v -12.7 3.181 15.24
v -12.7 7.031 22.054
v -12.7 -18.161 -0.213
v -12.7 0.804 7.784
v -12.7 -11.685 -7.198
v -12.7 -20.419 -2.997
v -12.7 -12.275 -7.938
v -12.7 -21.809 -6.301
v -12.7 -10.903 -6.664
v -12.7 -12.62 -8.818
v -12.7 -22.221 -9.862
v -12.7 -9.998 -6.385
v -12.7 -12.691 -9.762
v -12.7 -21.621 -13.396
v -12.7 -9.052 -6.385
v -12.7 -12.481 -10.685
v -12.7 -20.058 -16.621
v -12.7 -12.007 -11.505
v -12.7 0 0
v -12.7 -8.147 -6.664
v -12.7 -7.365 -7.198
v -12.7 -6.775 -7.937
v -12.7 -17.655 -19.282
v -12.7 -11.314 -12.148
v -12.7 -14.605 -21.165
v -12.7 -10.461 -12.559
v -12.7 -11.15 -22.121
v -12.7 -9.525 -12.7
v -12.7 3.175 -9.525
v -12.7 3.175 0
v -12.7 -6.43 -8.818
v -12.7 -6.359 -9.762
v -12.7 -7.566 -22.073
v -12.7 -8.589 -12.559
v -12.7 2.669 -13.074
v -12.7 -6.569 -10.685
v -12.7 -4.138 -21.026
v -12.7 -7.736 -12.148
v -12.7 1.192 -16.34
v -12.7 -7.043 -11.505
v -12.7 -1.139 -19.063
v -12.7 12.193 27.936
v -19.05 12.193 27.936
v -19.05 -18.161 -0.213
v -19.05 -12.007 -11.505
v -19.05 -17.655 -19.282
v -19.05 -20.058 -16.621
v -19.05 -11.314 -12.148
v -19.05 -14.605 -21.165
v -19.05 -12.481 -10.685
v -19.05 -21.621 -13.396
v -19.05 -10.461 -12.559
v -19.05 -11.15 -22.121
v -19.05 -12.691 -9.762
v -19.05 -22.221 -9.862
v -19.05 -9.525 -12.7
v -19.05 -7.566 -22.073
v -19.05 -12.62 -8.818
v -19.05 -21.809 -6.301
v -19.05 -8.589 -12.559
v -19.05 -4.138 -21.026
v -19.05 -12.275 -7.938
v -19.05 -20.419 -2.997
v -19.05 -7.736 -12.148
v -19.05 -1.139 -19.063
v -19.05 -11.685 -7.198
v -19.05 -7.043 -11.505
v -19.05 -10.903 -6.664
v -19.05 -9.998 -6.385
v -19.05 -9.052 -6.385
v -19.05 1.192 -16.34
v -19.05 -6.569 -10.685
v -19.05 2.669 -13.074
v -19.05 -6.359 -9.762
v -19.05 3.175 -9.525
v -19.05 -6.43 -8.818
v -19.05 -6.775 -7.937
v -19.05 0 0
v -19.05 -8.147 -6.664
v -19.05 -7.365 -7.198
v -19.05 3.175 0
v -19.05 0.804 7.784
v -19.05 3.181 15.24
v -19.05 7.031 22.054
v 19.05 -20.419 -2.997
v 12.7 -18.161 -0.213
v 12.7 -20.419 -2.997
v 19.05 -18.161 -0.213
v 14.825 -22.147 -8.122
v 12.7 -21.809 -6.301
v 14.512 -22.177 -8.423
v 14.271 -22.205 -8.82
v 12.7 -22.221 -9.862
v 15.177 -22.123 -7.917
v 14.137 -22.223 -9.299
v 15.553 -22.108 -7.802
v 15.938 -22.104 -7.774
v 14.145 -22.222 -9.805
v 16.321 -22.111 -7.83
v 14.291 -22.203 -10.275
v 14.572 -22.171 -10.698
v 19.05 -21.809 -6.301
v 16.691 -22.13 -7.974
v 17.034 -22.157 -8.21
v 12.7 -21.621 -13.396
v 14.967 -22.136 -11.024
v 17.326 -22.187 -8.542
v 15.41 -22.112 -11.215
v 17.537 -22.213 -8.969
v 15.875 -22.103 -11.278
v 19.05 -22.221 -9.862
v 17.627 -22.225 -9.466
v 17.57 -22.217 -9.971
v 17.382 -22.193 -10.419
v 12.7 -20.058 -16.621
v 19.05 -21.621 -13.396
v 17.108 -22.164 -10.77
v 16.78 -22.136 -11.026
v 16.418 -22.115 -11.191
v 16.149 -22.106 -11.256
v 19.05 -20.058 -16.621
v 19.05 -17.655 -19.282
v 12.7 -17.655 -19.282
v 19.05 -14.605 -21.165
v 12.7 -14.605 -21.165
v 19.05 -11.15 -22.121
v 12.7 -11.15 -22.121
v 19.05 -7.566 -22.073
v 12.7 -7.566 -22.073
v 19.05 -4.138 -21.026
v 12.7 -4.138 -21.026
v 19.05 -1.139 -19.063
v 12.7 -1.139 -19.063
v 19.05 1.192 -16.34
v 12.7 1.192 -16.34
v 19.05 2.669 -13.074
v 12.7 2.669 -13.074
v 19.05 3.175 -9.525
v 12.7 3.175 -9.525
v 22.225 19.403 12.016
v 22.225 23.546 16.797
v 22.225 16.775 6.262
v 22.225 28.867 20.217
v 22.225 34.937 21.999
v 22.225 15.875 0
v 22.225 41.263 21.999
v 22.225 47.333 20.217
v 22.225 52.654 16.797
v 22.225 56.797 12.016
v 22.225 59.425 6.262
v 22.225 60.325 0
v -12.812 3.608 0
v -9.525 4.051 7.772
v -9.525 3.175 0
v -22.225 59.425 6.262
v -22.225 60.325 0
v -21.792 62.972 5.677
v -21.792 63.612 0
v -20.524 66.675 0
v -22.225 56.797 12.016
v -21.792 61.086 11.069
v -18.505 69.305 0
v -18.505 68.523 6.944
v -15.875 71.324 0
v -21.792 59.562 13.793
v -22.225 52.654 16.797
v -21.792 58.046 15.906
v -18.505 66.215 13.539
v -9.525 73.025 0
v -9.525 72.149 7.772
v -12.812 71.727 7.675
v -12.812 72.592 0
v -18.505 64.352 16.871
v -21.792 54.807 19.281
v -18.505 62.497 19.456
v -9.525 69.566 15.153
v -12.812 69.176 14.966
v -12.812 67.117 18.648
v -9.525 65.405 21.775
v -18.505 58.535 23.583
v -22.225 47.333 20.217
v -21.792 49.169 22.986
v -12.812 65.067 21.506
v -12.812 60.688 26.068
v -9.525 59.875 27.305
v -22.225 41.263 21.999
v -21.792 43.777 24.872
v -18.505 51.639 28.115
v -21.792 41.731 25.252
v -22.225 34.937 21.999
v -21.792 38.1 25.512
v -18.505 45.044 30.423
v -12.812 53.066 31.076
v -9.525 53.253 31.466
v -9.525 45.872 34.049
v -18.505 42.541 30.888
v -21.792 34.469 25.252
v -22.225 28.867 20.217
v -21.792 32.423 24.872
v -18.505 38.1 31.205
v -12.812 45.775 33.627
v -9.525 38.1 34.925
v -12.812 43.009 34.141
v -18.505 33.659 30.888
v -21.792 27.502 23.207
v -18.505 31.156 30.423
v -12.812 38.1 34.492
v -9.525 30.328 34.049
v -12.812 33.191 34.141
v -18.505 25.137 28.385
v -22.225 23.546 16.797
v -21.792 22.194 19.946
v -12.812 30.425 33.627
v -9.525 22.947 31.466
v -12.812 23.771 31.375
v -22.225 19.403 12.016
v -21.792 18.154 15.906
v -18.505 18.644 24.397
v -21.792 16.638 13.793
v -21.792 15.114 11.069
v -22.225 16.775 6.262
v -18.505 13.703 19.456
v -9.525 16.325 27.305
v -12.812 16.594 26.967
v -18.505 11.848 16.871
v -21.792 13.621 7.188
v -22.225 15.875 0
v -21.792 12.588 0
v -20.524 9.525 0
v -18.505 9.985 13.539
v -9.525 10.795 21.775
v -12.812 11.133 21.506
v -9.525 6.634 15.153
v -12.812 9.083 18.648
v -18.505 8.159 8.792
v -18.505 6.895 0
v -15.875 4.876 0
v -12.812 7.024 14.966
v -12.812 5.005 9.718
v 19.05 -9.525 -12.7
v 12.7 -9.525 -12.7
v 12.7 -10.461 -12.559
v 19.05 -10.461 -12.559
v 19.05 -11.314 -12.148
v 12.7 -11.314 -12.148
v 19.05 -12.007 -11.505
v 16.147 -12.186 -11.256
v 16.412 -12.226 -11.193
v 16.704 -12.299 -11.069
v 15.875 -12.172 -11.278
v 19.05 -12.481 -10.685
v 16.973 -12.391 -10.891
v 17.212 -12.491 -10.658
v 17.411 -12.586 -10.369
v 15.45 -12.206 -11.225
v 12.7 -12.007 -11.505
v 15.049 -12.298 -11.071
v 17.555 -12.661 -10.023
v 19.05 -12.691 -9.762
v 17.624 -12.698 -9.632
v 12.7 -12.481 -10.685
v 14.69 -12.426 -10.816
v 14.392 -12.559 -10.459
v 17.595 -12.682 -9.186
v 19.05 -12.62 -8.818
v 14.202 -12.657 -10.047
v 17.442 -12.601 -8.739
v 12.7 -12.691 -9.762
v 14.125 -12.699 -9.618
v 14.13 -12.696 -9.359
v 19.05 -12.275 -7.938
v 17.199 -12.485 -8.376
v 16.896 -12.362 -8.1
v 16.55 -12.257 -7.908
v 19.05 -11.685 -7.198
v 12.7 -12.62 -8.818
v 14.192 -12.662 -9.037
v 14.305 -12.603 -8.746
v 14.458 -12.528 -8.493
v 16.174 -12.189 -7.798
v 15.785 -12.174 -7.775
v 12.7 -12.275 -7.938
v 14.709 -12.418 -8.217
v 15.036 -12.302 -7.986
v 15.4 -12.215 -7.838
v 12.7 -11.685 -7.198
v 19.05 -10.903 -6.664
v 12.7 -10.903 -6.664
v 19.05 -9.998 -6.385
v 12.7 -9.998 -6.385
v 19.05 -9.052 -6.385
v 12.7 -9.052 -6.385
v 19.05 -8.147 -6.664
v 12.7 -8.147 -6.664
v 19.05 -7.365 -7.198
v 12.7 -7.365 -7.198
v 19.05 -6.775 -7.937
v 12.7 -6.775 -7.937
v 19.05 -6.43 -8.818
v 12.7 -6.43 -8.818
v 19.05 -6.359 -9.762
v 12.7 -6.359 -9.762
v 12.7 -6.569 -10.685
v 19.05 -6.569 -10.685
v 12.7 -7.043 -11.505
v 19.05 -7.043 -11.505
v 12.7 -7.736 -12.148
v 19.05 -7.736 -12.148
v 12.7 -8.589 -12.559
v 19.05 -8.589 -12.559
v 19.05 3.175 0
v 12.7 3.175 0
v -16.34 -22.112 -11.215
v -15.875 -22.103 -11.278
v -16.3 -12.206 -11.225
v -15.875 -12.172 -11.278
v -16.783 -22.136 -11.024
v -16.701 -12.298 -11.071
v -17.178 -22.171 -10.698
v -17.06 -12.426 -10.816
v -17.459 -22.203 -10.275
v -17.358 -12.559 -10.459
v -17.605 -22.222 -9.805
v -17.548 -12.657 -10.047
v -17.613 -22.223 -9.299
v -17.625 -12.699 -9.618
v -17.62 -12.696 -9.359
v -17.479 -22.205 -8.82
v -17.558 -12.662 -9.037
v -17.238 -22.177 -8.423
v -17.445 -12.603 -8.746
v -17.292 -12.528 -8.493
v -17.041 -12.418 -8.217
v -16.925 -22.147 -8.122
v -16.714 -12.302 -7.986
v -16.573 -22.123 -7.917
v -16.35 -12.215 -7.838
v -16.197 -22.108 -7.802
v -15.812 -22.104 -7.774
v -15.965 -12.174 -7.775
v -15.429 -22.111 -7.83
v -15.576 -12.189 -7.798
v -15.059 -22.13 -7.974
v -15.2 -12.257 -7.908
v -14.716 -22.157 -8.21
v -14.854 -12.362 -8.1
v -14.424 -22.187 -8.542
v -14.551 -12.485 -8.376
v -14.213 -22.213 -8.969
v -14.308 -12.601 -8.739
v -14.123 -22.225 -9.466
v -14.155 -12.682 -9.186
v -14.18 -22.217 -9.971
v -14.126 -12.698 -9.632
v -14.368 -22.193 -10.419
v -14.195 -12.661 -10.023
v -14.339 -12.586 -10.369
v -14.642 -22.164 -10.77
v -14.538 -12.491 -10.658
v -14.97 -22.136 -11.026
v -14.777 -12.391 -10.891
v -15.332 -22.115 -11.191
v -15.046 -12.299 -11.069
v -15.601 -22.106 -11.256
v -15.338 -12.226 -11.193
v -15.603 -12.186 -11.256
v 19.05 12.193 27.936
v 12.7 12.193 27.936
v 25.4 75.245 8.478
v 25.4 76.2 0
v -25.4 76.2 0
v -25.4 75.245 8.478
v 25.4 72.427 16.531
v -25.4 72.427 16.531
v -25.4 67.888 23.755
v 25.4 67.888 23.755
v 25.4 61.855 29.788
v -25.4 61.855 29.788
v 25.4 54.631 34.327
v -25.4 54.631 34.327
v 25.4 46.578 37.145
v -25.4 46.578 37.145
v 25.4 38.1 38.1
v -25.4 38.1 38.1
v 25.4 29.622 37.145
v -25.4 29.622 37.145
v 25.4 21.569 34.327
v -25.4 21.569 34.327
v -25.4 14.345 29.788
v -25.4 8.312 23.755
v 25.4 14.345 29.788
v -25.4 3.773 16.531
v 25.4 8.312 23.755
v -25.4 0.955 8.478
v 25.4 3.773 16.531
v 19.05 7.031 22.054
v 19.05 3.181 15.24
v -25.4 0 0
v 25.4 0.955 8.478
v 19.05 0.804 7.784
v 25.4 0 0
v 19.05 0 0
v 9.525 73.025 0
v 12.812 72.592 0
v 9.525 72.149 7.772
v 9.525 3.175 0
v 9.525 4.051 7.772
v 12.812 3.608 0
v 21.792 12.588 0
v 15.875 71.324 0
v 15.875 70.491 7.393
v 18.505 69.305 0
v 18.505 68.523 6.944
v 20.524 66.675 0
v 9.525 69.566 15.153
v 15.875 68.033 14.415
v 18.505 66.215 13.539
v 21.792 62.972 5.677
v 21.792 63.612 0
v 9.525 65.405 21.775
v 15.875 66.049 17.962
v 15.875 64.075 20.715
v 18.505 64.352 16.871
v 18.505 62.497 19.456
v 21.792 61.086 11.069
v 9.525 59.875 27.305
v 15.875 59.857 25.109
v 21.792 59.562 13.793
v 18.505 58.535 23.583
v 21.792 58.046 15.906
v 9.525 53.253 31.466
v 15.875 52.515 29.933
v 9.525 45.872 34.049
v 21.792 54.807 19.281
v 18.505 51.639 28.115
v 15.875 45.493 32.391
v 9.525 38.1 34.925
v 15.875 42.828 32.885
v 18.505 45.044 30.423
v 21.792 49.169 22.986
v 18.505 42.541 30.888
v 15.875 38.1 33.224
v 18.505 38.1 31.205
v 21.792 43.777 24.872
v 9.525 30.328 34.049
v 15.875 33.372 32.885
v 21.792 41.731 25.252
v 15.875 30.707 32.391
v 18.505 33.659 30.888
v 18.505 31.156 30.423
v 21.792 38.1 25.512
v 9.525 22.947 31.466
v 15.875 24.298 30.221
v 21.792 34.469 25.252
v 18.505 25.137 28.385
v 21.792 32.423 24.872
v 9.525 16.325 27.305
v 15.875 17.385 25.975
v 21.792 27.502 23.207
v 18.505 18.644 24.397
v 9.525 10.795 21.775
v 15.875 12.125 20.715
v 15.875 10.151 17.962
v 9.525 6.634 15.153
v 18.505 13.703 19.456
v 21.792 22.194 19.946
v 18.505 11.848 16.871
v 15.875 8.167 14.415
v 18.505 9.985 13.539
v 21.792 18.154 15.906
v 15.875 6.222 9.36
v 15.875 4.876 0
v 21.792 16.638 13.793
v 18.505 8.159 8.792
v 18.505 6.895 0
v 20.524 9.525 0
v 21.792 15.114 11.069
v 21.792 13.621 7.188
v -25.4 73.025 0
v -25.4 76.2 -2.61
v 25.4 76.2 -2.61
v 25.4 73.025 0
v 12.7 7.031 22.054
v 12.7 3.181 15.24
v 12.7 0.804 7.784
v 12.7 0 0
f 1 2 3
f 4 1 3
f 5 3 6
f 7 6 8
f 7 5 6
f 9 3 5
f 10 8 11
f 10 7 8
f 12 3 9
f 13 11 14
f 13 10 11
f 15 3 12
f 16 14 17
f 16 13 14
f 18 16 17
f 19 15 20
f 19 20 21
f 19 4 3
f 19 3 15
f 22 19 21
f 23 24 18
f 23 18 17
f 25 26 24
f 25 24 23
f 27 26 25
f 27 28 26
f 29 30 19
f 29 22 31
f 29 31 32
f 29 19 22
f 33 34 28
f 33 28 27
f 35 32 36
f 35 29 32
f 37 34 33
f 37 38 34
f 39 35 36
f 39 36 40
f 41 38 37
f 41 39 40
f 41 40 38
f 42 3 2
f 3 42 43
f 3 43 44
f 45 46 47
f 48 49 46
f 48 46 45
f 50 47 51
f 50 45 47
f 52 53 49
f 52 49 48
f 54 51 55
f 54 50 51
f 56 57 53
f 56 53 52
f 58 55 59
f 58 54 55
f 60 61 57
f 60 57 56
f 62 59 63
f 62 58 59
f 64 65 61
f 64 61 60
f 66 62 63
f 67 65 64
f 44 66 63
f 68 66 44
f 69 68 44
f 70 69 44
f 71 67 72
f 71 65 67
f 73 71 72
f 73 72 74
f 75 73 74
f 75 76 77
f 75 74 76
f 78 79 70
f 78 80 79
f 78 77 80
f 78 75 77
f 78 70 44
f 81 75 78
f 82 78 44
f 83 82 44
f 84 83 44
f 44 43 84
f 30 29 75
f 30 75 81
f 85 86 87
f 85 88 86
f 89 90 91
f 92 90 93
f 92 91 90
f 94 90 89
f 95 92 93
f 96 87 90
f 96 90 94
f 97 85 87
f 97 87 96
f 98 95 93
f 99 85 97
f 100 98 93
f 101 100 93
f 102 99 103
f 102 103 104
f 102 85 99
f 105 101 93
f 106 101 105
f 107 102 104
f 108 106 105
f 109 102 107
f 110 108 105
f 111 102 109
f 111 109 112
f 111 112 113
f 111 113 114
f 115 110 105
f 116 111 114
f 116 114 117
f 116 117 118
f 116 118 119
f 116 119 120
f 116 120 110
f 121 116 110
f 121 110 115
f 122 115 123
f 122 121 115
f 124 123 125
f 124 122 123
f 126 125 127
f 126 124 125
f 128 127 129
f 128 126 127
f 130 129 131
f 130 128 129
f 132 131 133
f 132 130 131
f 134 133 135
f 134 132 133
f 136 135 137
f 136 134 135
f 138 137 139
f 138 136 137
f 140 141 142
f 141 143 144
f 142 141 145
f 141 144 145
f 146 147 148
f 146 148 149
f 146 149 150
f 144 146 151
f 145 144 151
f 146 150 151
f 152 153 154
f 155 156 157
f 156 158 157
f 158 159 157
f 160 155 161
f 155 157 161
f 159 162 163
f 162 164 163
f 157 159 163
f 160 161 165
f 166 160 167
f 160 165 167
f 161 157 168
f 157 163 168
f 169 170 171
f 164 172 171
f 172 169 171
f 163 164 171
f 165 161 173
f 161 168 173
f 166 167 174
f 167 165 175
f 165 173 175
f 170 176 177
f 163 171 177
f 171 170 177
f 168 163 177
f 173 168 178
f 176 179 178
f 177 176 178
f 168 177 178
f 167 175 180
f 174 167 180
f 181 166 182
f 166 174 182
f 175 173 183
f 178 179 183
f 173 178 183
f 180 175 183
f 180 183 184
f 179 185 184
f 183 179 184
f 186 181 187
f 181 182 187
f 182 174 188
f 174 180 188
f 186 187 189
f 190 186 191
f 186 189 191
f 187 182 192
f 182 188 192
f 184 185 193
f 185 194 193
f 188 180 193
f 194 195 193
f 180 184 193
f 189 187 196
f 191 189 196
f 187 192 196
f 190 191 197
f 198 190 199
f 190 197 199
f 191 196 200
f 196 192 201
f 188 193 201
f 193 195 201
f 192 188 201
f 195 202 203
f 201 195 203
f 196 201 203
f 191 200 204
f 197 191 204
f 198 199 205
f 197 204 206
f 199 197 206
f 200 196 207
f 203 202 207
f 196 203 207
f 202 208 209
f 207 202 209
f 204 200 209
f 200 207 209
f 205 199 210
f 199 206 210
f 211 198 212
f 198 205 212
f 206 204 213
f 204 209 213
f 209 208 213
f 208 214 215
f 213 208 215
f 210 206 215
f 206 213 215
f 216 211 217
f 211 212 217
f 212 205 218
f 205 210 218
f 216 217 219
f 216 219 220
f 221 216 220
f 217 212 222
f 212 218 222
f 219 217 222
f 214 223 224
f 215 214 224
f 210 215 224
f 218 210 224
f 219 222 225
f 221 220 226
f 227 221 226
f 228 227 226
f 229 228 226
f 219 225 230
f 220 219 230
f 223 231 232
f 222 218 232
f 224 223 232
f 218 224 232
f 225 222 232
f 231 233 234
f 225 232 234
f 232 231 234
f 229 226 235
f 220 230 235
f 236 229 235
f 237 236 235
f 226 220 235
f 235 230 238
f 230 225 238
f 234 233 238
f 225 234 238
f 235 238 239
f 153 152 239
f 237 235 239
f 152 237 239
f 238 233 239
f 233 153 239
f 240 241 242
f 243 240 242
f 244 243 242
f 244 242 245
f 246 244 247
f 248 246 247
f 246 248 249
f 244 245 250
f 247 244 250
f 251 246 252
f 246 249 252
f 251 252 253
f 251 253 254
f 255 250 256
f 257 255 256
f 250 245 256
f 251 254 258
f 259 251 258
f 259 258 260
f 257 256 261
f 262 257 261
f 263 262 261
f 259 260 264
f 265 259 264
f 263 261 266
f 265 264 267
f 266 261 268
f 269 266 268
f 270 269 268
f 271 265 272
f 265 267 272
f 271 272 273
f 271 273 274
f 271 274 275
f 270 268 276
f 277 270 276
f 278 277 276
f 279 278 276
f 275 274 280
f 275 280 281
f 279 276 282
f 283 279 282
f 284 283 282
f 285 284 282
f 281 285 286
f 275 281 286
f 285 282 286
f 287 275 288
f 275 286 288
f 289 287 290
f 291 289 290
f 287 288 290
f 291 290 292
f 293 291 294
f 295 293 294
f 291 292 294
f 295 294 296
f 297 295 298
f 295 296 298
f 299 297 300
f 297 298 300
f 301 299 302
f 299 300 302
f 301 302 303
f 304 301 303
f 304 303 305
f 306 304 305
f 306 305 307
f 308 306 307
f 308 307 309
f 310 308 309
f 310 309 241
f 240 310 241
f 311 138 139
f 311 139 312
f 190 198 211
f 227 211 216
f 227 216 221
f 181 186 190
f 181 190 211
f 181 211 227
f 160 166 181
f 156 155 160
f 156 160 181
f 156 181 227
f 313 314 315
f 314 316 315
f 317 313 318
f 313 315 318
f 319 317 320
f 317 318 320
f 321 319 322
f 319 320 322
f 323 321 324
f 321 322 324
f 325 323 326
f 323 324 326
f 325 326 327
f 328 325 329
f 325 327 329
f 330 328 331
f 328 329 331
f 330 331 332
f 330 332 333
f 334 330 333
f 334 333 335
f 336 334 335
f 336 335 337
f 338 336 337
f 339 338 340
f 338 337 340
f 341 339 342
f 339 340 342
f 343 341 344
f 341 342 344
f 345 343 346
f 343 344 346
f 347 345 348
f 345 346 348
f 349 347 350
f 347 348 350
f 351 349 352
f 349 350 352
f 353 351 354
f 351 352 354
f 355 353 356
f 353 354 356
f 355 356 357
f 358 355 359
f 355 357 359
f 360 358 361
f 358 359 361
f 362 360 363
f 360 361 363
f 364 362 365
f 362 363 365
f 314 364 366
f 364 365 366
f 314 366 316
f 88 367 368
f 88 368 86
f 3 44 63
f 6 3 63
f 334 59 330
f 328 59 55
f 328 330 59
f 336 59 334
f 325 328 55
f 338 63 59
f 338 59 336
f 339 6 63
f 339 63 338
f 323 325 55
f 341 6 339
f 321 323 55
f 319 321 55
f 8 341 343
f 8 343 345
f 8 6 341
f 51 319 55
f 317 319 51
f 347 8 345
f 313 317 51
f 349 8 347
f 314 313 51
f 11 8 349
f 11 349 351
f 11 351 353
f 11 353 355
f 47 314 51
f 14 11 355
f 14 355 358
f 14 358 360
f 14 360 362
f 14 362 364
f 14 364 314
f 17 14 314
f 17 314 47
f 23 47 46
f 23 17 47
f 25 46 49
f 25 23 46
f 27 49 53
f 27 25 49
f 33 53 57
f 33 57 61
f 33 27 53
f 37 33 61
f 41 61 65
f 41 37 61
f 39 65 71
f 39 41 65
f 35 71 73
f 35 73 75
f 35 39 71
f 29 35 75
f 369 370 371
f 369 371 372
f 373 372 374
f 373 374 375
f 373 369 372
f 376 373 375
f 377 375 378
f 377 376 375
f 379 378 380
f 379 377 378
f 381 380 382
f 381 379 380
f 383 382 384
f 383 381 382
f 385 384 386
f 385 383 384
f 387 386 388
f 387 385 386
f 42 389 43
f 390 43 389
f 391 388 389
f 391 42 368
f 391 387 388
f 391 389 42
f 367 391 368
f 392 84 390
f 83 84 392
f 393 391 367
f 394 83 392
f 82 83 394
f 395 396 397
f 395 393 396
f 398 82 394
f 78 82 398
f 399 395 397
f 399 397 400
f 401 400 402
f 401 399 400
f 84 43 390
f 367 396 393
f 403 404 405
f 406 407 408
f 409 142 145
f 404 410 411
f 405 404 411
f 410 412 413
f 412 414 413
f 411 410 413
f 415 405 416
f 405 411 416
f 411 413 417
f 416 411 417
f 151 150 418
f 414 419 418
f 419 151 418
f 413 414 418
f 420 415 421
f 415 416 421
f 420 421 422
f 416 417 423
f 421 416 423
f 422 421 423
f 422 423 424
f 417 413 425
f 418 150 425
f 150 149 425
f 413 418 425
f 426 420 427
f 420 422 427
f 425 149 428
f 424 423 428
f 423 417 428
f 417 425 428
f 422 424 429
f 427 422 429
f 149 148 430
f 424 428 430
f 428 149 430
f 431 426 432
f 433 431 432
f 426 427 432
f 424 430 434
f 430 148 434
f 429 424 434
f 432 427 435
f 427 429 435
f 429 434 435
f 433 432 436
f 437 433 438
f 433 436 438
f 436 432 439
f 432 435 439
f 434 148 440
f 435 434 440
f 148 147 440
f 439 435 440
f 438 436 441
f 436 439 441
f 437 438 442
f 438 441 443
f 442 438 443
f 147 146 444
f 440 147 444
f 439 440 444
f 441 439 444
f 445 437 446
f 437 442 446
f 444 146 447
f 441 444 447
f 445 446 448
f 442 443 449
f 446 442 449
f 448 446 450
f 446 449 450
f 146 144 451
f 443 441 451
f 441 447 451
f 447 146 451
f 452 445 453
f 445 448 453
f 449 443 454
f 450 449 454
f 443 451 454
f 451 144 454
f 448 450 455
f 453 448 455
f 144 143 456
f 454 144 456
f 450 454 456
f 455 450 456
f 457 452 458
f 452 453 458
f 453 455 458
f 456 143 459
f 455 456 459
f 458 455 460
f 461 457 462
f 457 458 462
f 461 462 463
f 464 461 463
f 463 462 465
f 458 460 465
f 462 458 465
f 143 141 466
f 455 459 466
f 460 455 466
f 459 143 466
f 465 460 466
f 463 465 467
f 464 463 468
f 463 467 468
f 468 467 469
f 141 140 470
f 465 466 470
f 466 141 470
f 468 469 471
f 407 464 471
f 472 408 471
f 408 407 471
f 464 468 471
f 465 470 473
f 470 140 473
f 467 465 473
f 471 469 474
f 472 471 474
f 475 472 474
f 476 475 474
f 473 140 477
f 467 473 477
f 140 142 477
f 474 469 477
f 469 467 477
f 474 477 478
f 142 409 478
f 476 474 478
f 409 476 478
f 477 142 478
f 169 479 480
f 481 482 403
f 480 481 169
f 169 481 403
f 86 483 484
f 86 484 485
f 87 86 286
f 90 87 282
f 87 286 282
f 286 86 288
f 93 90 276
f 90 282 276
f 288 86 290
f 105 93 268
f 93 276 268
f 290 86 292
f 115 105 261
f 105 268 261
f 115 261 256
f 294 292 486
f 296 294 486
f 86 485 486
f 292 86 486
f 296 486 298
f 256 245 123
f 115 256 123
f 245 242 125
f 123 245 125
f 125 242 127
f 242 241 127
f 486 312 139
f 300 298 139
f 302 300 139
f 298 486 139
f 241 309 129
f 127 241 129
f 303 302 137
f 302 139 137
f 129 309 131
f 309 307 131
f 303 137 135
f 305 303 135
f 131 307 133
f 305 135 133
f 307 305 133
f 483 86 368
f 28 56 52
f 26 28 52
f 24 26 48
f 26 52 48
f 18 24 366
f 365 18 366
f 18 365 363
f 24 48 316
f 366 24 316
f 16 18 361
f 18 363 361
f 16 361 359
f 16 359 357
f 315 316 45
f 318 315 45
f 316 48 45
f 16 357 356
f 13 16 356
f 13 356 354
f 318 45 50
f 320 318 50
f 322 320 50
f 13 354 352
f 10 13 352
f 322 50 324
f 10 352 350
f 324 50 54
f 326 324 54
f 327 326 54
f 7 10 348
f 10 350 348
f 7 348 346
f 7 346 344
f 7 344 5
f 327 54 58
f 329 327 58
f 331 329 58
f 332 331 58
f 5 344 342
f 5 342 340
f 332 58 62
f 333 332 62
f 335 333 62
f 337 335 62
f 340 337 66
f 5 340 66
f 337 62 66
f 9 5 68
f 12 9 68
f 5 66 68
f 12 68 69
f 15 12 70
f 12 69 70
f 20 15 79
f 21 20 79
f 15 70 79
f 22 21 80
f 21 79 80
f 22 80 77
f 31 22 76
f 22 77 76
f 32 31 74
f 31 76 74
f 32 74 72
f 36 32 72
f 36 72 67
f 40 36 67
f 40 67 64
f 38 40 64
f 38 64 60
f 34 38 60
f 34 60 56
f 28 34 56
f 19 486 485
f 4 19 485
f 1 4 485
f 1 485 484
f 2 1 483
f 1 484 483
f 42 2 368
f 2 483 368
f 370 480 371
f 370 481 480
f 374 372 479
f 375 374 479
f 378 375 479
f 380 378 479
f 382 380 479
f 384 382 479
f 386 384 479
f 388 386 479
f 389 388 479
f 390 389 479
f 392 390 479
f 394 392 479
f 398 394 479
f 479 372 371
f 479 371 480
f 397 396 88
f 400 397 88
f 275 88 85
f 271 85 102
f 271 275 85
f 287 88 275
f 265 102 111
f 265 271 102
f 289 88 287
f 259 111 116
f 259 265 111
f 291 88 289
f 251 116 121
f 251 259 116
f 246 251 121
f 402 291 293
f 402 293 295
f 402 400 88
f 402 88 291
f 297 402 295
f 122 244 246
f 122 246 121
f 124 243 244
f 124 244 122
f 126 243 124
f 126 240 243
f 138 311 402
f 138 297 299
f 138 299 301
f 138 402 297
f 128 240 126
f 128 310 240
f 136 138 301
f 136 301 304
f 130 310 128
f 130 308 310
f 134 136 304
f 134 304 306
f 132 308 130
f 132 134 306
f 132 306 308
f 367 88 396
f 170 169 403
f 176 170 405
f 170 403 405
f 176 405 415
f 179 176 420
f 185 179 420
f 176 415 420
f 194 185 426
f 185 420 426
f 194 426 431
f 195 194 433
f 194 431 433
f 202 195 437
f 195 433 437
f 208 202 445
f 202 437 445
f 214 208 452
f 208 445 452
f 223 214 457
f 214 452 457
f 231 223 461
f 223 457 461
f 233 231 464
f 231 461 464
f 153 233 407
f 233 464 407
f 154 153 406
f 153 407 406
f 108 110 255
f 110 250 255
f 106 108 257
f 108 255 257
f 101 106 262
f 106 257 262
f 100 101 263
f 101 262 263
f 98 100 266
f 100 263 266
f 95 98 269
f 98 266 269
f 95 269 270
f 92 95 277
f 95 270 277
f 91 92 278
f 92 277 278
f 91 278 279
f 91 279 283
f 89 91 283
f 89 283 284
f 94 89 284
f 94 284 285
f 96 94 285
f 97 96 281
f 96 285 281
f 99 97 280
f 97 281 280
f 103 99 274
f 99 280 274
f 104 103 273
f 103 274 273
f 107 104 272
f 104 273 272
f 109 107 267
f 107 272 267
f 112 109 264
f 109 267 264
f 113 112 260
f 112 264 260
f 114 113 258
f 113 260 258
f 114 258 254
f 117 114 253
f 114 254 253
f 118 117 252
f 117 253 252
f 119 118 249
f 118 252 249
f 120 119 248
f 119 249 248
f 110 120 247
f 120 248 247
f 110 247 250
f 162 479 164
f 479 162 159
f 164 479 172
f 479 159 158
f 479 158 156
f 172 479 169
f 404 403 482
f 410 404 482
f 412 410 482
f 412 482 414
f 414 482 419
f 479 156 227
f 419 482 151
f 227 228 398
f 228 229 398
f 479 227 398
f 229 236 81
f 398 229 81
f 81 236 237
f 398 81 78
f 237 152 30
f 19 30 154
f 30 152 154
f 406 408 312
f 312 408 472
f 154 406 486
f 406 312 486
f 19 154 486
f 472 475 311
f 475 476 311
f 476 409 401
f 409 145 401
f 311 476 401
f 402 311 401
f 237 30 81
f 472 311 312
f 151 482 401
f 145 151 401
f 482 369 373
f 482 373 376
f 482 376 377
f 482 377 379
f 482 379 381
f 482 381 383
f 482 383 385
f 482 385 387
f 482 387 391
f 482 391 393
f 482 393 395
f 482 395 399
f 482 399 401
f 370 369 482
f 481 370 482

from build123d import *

# Parameters (mm, degrees)
BOSS_EXTRUDE1_DEPTH                 = 25.4
SHELL1_T                            = -3.175
SKETCH4_R                           = 12.7
BOSS_EXTRUDE3_DEPTH                 = 19.05
BOSS_EXTRUDE4_DEPTH                 = 19.05
SKETCH6_R                           = 12.7
CUT_EXTRUDE2_DEPTH                  = 12.7
CUT_EXTRUDE3_START                  = 12.7
SKETCH6_2_R                         = 12.7
CUT_EXTRUDE3_DEPTH                  = 12.7
CUT_EXTRUDE4_REACH                  = 98.093
SKETCH7_R                           = 3.175
BOSS_EXTRUDE5_REACH                 = 98.093
CUT_EXTRUDE5_DEPTH                  = 12.7
BOSS_EXTRUDE6_DEPTH                 = 25.4
FILLET2_R                           = 12.7
CUT_EXTRUDE6_REACH                  = 109.812
CUT_EXTRUDE6_END_RADIUS             = 3.175
SKETCH12_R                          = 1.7526
CUT_EXTRUDE6_DIRECTION_2_REACH      = 109.812
CUT_EXTRUDE6_DIRECTION_2_END_RADIUS = 12.7


with BuildPart() as part:
    # Sketch2 → Boss-Extrude1 (new, symmetric)
    with BuildSketch(Plane(origin=(0, 0, 0), x_dir=(0, 0, -1), z_dir=(1, 0, 0))):
        with BuildLine():
            Line((0, 0), (0, 76.2))
            ThreePointArc((0, 76.2), (-38.1, 38.1), (0, 0))
        make_face()
    extrude(amount=BOSS_EXTRUDE1_DEPTH, both=True)

    # Shell1
    shell1_openings = [part.faces().sort_by_distance(p)[0] for p in [
        (0, 38.1, 0),
    ]]
    offset(amount=SHELL1_T, openings=shell1_openings)



with BuildPart() as body_2:
    # Sketch4 → Boss-Extrude3 (new, symmetric)
    with BuildSketch(Plane(origin=(0, 0, 0), x_dir=(0, 0, -1), z_dir=(1, 0, 0))):
        with Locations(Location((9.525, -9.525, 0), (0, 0, 180))):
            Circle(SKETCH4_R)
    extrude(amount=BOSS_EXTRUDE3_DEPTH, both=True)


with BuildPart() as part_1:
    add(part.part)

    add(body_2.part)  # Boss-Extrude4 merges body 2
    # Sketch5 → Boss-Extrude4 (add, symmetric)
    with BuildSketch(Plane(origin=(0, 0, 0), x_dir=(0, 0, -1), z_dir=(1, 0, 0))):
        with BuildLine():
            Line((0, 3.175), (0, 0))
            Line((0, 0), (1.124739587, 0))
            ThreePointArc((1.124739587, 0), (5.034871939, 2.354762203), (9.525, 3.175))
            Line((9.525, 3.175), (0, 3.175))
        make_face()
    extrude(amount=BOSS_EXTRUDE4_DEPTH, both=True)

    # Sketch6 → Cut-Extrude2 (cut)
    with BuildSketch(Plane(origin=(0, 0, 0), x_dir=(0, 0, -1), z_dir=(1, 0, 0))):
        with Locations((9.525, -9.525)):
            Circle(SKETCH6_R)
    extrude(amount=-CUT_EXTRUDE2_DEPTH, mode=Mode.SUBTRACT)

    # Sketch6<2> → Cut-Extrude3 (cut)
    with BuildSketch(Plane(origin=(0, 0, 0), x_dir=(0, 0, -1), z_dir=(1, 0, 0)).offset(CUT_EXTRUDE3_START)):
        with Locations((9.525, -9.525)):
            Circle(SKETCH6_2_R)
    extrude(amount=-CUT_EXTRUDE3_DEPTH, mode=Mode.SUBTRACT)

    # Cut-Extrude4: up to this face of the body (flat: up to its plane)
    cut_extrude4_end = Plane(part_1.part.faces().sort_by_distance((19.05, -9.258016607, -9.360446087))[0])
    # Sketch7 → Cut-Extrude4 (cut, up to the picked face)
    with BuildSketch(Plane.ZY.offset(19.05), mode=Mode.PRIVATE) as cut_extrude4_sk1:
        with Locations(Location((-9.525, -9.525, 0), (0, 0, 180))):
            Circle(SKETCH7_R)
    cut_extrude4_tool1 = split(extrude(cut_extrude4_sk1.sketch, amount=-CUT_EXTRUDE4_REACH, mode=Mode.PRIVATE), bisect_by=cut_extrude4_end, keep=Keep.BOTH, mode=Mode.PRIVATE)
    add(cut_extrude4_tool1.solids().sort_by(Axis((-19.05, -9.525, -9.525), (1, 0, 0)))[0], mode=Mode.SUBTRACT)

    # Boss-Extrude5: up to this face of the body (flat: up to its plane)
    boss_extrude5_end = Plane(part_1.part.faces().sort_by_distance((-19.05, 2.815789755, -4.7625))[0])
    # Sketch8 → Boss-Extrude5 (add, up to the picked face)
    with BuildSketch(Plane(origin=(19.05, 0, 0), x_dir=(0, 0, -1), z_dir=(1, 0, 0)), mode=Mode.PRIVATE) as boss_extrude5_sk1:
        with BuildLine():
            Line((-27.936104056, 12.192779189), (0.212965315, -18.16074027))
            Line((0.212965315, -18.16074027), (5.034871939, -21.404762203))
            Line((5.034871939, -21.404762203), (1.124739587, 0))
            Line((1.124739587, 0), (0, 3.175))
            ThreePointArc((0, 3.175), (-13.704863106, 5.9762961), (-25.211222013, 13.9308066))
            Line((-25.211222013, 13.9308066), (-27.936104056, 12.192779189))
        make_face()
    boss_extrude5_tool1 = split(extrude(boss_extrude5_sk1.sketch, amount=-BOSS_EXTRUDE5_REACH, mode=Mode.PRIVATE), bisect_by=boss_extrude5_end, keep=Keep.BOTH, mode=Mode.PRIVATE)
    add(boss_extrude5_tool1.solids().sort_by(Axis((19.05, -2.840531, 7.724646), (-1, 0, 0)))[0])

    # Sketch9 → Cut-Extrude5 (cut, symmetric)
    with BuildSketch(Plane(origin=(0, 0, 0), x_dir=(0, 0, -1), z_dir=(1, 0, 0))):
        with BuildLine():
            Line((0, 3.175), (0, 0))
            ThreePointArc((0, 0), (-15.240486985, 3.180985746), (-27.936104056, 12.192779189))
            Line((-27.936104056, 12.192779189), (0.212965315, -18.16074027))
            ThreePointArc((0.212965315, -18.16074027), (21.164671418, -14.605162328), (9.525, 3.175))
            Line((9.525, 3.175), (0, 3.175))
        make_face()
    extrude(amount=CUT_EXTRUDE5_DEPTH, both=True, mode=Mode.SUBTRACT)

    # Sketch11 → Boss-Extrude6 (add, symmetric)
    with BuildSketch(Plane(origin=(0, 0, 0), x_dir=(0, 0, -1), z_dir=(1, 0, 0))):
        Polygon((2.609832197, 76.2), (0, 76.2), (0, 73.025), align=None)
    extrude(amount=BOSS_EXTRUDE6_DEPTH, both=True)

    # Fillet2
    # the kernel refuses this fillet: 12.7 mm, written as the material it adds along each edge
    with BuildSketch(Plane(origin=(-22.225, 38.1, 0), x_dir=(0, 1, 0), z_dir=(0, 0, -1))) as fillet2_piece_1:
        with BuildLine():
            CenterArc((34.925 - FILLET2_R, FILLET2_R), FILLET2_R, 270, 90)
            Line((34.925 - FILLET2_R, 0), (34.925, 0))
            Line((34.925, 0), (34.925, FILLET2_R))
        make_face()
    revolve(axis=Axis((-22.225, 38.1, 0), (1, 0, 0)), revolution_arc=180)
    with BuildSketch(Plane(origin=(22.225, 38.1, 0), x_dir=(0, 1, 0), z_dir=(0, 0, -1))) as fillet2_piece_2:
        with BuildLine():
            CenterArc((34.925 - FILLET2_R, -FILLET2_R), FILLET2_R, 0, 90)
            Line((34.925 - FILLET2_R, 0), (34.925, 0))
            Line((34.925, 0), (34.925, -FILLET2_R))
        make_face()
    revolve(axis=Axis((22.225, 38.1, 0), (1, 0, 0)), revolution_arc=180)

    # Cut-Extrude6: up to this cylinder (the profile starts outside it)
    cut_extrude6_end = Plane(origin=(0, -9.525, -9.525), z_dir=(-1, 0, 0)) * Cylinder(CUT_EXTRUDE6_END_RADIUS, 258.724, mode=Mode.PRIVATE)
    # Sketch12 → Cut-Extrude6 (cut, up to the surface)
    with BuildSketch(Plane(origin=(0, -21.404762203, 0), x_dir=(1, 0, 0), z_dir=(0, 1, 0)), mode=Mode.PRIVATE) as cut_extrude6_sk1:
        with Locations(Location((15.875, 9.525, 0), (0, 0, 90))):
            Circle(SKETCH12_R)
    cut_extrude6_tool1 = extrude(cut_extrude6_sk1.sketch, amount=CUT_EXTRUDE6_REACH, mode=Mode.PRIVATE) - cut_extrude6_end
    add(cut_extrude6_tool1.solids().sort_by_distance((15.875, -21.404762, -9.525))[0], mode=Mode.SUBTRACT)
    # Sketch12 → Cut-Extrude6 (cut, up to the surface)
    with BuildSketch(Plane(origin=(0, -21.404762203, 0), x_dir=(1, 0, 0), z_dir=(0, 1, 0)), mode=Mode.PRIVATE) as cut_extrude6_sk2:
        with Locations(Location((-15.875, 9.525, 0), (0, 0, 90))):
            Circle(SKETCH12_R)
    cut_extrude6_tool2 = extrude(cut_extrude6_sk2.sketch, amount=CUT_EXTRUDE6_REACH, mode=Mode.PRIVATE) - cut_extrude6_end
    add(cut_extrude6_tool2.solids().sort_by_distance((-15.875, -21.404762, -9.525))[0], mode=Mode.SUBTRACT)

    # Cut-Extrude6 direction 2: up to this cylinder (the profile starts inside it)
    cut_extrude6_direction_2_end = Plane(origin=(0, -9.525, -9.525), z_dir=(-1, 0, 0)) * Cylinder(CUT_EXTRUDE6_DIRECTION_2_END_RADIUS, 277.774, mode=Mode.PRIVATE)
    # Sketch12 → Cut-Extrude6 direction 2 (cut, up to the surface)
    with BuildSketch(Plane(origin=(0, -21.404762203, 0), x_dir=(1, 0, 0), z_dir=(0, 1, 0)), mode=Mode.PRIVATE) as cut_extrude6_direction_2_sk1:
        with Locations(Location((15.875, 9.525, 0), (0, 0, 90))):
            Circle(SKETCH12_R)
    cut_extrude6_direction_2_tool1 = extrude(cut_extrude6_direction_2_sk1.sketch, amount=-CUT_EXTRUDE6_DIRECTION_2_REACH, mode=Mode.PRIVATE) & cut_extrude6_direction_2_end
    add(cut_extrude6_direction_2_tool1.solids().sort_by_distance((15.875, -21.404762, -9.525))[0], mode=Mode.SUBTRACT)
    # Sketch12 → Cut-Extrude6 direction 2 (cut, up to the surface)
    with BuildSketch(Plane(origin=(0, -21.404762203, 0), x_dir=(1, 0, 0), z_dir=(0, 1, 0)), mode=Mode.PRIVATE) as cut_extrude6_direction_2_sk2:
        with Locations(Location((-15.875, 9.525, 0), (0, 0, 90))):
            Circle(SKETCH12_R)
    cut_extrude6_direction_2_tool2 = extrude(cut_extrude6_direction_2_sk2.sketch, amount=-CUT_EXTRUDE6_DIRECTION_2_REACH, mode=Mode.PRIVATE) & cut_extrude6_direction_2_end
    add(cut_extrude6_direction_2_tool2.solids().sort_by_distance((-15.875, -21.404762, -9.525))[0], mode=Mode.SUBTRACT)


solid = part_1.part
